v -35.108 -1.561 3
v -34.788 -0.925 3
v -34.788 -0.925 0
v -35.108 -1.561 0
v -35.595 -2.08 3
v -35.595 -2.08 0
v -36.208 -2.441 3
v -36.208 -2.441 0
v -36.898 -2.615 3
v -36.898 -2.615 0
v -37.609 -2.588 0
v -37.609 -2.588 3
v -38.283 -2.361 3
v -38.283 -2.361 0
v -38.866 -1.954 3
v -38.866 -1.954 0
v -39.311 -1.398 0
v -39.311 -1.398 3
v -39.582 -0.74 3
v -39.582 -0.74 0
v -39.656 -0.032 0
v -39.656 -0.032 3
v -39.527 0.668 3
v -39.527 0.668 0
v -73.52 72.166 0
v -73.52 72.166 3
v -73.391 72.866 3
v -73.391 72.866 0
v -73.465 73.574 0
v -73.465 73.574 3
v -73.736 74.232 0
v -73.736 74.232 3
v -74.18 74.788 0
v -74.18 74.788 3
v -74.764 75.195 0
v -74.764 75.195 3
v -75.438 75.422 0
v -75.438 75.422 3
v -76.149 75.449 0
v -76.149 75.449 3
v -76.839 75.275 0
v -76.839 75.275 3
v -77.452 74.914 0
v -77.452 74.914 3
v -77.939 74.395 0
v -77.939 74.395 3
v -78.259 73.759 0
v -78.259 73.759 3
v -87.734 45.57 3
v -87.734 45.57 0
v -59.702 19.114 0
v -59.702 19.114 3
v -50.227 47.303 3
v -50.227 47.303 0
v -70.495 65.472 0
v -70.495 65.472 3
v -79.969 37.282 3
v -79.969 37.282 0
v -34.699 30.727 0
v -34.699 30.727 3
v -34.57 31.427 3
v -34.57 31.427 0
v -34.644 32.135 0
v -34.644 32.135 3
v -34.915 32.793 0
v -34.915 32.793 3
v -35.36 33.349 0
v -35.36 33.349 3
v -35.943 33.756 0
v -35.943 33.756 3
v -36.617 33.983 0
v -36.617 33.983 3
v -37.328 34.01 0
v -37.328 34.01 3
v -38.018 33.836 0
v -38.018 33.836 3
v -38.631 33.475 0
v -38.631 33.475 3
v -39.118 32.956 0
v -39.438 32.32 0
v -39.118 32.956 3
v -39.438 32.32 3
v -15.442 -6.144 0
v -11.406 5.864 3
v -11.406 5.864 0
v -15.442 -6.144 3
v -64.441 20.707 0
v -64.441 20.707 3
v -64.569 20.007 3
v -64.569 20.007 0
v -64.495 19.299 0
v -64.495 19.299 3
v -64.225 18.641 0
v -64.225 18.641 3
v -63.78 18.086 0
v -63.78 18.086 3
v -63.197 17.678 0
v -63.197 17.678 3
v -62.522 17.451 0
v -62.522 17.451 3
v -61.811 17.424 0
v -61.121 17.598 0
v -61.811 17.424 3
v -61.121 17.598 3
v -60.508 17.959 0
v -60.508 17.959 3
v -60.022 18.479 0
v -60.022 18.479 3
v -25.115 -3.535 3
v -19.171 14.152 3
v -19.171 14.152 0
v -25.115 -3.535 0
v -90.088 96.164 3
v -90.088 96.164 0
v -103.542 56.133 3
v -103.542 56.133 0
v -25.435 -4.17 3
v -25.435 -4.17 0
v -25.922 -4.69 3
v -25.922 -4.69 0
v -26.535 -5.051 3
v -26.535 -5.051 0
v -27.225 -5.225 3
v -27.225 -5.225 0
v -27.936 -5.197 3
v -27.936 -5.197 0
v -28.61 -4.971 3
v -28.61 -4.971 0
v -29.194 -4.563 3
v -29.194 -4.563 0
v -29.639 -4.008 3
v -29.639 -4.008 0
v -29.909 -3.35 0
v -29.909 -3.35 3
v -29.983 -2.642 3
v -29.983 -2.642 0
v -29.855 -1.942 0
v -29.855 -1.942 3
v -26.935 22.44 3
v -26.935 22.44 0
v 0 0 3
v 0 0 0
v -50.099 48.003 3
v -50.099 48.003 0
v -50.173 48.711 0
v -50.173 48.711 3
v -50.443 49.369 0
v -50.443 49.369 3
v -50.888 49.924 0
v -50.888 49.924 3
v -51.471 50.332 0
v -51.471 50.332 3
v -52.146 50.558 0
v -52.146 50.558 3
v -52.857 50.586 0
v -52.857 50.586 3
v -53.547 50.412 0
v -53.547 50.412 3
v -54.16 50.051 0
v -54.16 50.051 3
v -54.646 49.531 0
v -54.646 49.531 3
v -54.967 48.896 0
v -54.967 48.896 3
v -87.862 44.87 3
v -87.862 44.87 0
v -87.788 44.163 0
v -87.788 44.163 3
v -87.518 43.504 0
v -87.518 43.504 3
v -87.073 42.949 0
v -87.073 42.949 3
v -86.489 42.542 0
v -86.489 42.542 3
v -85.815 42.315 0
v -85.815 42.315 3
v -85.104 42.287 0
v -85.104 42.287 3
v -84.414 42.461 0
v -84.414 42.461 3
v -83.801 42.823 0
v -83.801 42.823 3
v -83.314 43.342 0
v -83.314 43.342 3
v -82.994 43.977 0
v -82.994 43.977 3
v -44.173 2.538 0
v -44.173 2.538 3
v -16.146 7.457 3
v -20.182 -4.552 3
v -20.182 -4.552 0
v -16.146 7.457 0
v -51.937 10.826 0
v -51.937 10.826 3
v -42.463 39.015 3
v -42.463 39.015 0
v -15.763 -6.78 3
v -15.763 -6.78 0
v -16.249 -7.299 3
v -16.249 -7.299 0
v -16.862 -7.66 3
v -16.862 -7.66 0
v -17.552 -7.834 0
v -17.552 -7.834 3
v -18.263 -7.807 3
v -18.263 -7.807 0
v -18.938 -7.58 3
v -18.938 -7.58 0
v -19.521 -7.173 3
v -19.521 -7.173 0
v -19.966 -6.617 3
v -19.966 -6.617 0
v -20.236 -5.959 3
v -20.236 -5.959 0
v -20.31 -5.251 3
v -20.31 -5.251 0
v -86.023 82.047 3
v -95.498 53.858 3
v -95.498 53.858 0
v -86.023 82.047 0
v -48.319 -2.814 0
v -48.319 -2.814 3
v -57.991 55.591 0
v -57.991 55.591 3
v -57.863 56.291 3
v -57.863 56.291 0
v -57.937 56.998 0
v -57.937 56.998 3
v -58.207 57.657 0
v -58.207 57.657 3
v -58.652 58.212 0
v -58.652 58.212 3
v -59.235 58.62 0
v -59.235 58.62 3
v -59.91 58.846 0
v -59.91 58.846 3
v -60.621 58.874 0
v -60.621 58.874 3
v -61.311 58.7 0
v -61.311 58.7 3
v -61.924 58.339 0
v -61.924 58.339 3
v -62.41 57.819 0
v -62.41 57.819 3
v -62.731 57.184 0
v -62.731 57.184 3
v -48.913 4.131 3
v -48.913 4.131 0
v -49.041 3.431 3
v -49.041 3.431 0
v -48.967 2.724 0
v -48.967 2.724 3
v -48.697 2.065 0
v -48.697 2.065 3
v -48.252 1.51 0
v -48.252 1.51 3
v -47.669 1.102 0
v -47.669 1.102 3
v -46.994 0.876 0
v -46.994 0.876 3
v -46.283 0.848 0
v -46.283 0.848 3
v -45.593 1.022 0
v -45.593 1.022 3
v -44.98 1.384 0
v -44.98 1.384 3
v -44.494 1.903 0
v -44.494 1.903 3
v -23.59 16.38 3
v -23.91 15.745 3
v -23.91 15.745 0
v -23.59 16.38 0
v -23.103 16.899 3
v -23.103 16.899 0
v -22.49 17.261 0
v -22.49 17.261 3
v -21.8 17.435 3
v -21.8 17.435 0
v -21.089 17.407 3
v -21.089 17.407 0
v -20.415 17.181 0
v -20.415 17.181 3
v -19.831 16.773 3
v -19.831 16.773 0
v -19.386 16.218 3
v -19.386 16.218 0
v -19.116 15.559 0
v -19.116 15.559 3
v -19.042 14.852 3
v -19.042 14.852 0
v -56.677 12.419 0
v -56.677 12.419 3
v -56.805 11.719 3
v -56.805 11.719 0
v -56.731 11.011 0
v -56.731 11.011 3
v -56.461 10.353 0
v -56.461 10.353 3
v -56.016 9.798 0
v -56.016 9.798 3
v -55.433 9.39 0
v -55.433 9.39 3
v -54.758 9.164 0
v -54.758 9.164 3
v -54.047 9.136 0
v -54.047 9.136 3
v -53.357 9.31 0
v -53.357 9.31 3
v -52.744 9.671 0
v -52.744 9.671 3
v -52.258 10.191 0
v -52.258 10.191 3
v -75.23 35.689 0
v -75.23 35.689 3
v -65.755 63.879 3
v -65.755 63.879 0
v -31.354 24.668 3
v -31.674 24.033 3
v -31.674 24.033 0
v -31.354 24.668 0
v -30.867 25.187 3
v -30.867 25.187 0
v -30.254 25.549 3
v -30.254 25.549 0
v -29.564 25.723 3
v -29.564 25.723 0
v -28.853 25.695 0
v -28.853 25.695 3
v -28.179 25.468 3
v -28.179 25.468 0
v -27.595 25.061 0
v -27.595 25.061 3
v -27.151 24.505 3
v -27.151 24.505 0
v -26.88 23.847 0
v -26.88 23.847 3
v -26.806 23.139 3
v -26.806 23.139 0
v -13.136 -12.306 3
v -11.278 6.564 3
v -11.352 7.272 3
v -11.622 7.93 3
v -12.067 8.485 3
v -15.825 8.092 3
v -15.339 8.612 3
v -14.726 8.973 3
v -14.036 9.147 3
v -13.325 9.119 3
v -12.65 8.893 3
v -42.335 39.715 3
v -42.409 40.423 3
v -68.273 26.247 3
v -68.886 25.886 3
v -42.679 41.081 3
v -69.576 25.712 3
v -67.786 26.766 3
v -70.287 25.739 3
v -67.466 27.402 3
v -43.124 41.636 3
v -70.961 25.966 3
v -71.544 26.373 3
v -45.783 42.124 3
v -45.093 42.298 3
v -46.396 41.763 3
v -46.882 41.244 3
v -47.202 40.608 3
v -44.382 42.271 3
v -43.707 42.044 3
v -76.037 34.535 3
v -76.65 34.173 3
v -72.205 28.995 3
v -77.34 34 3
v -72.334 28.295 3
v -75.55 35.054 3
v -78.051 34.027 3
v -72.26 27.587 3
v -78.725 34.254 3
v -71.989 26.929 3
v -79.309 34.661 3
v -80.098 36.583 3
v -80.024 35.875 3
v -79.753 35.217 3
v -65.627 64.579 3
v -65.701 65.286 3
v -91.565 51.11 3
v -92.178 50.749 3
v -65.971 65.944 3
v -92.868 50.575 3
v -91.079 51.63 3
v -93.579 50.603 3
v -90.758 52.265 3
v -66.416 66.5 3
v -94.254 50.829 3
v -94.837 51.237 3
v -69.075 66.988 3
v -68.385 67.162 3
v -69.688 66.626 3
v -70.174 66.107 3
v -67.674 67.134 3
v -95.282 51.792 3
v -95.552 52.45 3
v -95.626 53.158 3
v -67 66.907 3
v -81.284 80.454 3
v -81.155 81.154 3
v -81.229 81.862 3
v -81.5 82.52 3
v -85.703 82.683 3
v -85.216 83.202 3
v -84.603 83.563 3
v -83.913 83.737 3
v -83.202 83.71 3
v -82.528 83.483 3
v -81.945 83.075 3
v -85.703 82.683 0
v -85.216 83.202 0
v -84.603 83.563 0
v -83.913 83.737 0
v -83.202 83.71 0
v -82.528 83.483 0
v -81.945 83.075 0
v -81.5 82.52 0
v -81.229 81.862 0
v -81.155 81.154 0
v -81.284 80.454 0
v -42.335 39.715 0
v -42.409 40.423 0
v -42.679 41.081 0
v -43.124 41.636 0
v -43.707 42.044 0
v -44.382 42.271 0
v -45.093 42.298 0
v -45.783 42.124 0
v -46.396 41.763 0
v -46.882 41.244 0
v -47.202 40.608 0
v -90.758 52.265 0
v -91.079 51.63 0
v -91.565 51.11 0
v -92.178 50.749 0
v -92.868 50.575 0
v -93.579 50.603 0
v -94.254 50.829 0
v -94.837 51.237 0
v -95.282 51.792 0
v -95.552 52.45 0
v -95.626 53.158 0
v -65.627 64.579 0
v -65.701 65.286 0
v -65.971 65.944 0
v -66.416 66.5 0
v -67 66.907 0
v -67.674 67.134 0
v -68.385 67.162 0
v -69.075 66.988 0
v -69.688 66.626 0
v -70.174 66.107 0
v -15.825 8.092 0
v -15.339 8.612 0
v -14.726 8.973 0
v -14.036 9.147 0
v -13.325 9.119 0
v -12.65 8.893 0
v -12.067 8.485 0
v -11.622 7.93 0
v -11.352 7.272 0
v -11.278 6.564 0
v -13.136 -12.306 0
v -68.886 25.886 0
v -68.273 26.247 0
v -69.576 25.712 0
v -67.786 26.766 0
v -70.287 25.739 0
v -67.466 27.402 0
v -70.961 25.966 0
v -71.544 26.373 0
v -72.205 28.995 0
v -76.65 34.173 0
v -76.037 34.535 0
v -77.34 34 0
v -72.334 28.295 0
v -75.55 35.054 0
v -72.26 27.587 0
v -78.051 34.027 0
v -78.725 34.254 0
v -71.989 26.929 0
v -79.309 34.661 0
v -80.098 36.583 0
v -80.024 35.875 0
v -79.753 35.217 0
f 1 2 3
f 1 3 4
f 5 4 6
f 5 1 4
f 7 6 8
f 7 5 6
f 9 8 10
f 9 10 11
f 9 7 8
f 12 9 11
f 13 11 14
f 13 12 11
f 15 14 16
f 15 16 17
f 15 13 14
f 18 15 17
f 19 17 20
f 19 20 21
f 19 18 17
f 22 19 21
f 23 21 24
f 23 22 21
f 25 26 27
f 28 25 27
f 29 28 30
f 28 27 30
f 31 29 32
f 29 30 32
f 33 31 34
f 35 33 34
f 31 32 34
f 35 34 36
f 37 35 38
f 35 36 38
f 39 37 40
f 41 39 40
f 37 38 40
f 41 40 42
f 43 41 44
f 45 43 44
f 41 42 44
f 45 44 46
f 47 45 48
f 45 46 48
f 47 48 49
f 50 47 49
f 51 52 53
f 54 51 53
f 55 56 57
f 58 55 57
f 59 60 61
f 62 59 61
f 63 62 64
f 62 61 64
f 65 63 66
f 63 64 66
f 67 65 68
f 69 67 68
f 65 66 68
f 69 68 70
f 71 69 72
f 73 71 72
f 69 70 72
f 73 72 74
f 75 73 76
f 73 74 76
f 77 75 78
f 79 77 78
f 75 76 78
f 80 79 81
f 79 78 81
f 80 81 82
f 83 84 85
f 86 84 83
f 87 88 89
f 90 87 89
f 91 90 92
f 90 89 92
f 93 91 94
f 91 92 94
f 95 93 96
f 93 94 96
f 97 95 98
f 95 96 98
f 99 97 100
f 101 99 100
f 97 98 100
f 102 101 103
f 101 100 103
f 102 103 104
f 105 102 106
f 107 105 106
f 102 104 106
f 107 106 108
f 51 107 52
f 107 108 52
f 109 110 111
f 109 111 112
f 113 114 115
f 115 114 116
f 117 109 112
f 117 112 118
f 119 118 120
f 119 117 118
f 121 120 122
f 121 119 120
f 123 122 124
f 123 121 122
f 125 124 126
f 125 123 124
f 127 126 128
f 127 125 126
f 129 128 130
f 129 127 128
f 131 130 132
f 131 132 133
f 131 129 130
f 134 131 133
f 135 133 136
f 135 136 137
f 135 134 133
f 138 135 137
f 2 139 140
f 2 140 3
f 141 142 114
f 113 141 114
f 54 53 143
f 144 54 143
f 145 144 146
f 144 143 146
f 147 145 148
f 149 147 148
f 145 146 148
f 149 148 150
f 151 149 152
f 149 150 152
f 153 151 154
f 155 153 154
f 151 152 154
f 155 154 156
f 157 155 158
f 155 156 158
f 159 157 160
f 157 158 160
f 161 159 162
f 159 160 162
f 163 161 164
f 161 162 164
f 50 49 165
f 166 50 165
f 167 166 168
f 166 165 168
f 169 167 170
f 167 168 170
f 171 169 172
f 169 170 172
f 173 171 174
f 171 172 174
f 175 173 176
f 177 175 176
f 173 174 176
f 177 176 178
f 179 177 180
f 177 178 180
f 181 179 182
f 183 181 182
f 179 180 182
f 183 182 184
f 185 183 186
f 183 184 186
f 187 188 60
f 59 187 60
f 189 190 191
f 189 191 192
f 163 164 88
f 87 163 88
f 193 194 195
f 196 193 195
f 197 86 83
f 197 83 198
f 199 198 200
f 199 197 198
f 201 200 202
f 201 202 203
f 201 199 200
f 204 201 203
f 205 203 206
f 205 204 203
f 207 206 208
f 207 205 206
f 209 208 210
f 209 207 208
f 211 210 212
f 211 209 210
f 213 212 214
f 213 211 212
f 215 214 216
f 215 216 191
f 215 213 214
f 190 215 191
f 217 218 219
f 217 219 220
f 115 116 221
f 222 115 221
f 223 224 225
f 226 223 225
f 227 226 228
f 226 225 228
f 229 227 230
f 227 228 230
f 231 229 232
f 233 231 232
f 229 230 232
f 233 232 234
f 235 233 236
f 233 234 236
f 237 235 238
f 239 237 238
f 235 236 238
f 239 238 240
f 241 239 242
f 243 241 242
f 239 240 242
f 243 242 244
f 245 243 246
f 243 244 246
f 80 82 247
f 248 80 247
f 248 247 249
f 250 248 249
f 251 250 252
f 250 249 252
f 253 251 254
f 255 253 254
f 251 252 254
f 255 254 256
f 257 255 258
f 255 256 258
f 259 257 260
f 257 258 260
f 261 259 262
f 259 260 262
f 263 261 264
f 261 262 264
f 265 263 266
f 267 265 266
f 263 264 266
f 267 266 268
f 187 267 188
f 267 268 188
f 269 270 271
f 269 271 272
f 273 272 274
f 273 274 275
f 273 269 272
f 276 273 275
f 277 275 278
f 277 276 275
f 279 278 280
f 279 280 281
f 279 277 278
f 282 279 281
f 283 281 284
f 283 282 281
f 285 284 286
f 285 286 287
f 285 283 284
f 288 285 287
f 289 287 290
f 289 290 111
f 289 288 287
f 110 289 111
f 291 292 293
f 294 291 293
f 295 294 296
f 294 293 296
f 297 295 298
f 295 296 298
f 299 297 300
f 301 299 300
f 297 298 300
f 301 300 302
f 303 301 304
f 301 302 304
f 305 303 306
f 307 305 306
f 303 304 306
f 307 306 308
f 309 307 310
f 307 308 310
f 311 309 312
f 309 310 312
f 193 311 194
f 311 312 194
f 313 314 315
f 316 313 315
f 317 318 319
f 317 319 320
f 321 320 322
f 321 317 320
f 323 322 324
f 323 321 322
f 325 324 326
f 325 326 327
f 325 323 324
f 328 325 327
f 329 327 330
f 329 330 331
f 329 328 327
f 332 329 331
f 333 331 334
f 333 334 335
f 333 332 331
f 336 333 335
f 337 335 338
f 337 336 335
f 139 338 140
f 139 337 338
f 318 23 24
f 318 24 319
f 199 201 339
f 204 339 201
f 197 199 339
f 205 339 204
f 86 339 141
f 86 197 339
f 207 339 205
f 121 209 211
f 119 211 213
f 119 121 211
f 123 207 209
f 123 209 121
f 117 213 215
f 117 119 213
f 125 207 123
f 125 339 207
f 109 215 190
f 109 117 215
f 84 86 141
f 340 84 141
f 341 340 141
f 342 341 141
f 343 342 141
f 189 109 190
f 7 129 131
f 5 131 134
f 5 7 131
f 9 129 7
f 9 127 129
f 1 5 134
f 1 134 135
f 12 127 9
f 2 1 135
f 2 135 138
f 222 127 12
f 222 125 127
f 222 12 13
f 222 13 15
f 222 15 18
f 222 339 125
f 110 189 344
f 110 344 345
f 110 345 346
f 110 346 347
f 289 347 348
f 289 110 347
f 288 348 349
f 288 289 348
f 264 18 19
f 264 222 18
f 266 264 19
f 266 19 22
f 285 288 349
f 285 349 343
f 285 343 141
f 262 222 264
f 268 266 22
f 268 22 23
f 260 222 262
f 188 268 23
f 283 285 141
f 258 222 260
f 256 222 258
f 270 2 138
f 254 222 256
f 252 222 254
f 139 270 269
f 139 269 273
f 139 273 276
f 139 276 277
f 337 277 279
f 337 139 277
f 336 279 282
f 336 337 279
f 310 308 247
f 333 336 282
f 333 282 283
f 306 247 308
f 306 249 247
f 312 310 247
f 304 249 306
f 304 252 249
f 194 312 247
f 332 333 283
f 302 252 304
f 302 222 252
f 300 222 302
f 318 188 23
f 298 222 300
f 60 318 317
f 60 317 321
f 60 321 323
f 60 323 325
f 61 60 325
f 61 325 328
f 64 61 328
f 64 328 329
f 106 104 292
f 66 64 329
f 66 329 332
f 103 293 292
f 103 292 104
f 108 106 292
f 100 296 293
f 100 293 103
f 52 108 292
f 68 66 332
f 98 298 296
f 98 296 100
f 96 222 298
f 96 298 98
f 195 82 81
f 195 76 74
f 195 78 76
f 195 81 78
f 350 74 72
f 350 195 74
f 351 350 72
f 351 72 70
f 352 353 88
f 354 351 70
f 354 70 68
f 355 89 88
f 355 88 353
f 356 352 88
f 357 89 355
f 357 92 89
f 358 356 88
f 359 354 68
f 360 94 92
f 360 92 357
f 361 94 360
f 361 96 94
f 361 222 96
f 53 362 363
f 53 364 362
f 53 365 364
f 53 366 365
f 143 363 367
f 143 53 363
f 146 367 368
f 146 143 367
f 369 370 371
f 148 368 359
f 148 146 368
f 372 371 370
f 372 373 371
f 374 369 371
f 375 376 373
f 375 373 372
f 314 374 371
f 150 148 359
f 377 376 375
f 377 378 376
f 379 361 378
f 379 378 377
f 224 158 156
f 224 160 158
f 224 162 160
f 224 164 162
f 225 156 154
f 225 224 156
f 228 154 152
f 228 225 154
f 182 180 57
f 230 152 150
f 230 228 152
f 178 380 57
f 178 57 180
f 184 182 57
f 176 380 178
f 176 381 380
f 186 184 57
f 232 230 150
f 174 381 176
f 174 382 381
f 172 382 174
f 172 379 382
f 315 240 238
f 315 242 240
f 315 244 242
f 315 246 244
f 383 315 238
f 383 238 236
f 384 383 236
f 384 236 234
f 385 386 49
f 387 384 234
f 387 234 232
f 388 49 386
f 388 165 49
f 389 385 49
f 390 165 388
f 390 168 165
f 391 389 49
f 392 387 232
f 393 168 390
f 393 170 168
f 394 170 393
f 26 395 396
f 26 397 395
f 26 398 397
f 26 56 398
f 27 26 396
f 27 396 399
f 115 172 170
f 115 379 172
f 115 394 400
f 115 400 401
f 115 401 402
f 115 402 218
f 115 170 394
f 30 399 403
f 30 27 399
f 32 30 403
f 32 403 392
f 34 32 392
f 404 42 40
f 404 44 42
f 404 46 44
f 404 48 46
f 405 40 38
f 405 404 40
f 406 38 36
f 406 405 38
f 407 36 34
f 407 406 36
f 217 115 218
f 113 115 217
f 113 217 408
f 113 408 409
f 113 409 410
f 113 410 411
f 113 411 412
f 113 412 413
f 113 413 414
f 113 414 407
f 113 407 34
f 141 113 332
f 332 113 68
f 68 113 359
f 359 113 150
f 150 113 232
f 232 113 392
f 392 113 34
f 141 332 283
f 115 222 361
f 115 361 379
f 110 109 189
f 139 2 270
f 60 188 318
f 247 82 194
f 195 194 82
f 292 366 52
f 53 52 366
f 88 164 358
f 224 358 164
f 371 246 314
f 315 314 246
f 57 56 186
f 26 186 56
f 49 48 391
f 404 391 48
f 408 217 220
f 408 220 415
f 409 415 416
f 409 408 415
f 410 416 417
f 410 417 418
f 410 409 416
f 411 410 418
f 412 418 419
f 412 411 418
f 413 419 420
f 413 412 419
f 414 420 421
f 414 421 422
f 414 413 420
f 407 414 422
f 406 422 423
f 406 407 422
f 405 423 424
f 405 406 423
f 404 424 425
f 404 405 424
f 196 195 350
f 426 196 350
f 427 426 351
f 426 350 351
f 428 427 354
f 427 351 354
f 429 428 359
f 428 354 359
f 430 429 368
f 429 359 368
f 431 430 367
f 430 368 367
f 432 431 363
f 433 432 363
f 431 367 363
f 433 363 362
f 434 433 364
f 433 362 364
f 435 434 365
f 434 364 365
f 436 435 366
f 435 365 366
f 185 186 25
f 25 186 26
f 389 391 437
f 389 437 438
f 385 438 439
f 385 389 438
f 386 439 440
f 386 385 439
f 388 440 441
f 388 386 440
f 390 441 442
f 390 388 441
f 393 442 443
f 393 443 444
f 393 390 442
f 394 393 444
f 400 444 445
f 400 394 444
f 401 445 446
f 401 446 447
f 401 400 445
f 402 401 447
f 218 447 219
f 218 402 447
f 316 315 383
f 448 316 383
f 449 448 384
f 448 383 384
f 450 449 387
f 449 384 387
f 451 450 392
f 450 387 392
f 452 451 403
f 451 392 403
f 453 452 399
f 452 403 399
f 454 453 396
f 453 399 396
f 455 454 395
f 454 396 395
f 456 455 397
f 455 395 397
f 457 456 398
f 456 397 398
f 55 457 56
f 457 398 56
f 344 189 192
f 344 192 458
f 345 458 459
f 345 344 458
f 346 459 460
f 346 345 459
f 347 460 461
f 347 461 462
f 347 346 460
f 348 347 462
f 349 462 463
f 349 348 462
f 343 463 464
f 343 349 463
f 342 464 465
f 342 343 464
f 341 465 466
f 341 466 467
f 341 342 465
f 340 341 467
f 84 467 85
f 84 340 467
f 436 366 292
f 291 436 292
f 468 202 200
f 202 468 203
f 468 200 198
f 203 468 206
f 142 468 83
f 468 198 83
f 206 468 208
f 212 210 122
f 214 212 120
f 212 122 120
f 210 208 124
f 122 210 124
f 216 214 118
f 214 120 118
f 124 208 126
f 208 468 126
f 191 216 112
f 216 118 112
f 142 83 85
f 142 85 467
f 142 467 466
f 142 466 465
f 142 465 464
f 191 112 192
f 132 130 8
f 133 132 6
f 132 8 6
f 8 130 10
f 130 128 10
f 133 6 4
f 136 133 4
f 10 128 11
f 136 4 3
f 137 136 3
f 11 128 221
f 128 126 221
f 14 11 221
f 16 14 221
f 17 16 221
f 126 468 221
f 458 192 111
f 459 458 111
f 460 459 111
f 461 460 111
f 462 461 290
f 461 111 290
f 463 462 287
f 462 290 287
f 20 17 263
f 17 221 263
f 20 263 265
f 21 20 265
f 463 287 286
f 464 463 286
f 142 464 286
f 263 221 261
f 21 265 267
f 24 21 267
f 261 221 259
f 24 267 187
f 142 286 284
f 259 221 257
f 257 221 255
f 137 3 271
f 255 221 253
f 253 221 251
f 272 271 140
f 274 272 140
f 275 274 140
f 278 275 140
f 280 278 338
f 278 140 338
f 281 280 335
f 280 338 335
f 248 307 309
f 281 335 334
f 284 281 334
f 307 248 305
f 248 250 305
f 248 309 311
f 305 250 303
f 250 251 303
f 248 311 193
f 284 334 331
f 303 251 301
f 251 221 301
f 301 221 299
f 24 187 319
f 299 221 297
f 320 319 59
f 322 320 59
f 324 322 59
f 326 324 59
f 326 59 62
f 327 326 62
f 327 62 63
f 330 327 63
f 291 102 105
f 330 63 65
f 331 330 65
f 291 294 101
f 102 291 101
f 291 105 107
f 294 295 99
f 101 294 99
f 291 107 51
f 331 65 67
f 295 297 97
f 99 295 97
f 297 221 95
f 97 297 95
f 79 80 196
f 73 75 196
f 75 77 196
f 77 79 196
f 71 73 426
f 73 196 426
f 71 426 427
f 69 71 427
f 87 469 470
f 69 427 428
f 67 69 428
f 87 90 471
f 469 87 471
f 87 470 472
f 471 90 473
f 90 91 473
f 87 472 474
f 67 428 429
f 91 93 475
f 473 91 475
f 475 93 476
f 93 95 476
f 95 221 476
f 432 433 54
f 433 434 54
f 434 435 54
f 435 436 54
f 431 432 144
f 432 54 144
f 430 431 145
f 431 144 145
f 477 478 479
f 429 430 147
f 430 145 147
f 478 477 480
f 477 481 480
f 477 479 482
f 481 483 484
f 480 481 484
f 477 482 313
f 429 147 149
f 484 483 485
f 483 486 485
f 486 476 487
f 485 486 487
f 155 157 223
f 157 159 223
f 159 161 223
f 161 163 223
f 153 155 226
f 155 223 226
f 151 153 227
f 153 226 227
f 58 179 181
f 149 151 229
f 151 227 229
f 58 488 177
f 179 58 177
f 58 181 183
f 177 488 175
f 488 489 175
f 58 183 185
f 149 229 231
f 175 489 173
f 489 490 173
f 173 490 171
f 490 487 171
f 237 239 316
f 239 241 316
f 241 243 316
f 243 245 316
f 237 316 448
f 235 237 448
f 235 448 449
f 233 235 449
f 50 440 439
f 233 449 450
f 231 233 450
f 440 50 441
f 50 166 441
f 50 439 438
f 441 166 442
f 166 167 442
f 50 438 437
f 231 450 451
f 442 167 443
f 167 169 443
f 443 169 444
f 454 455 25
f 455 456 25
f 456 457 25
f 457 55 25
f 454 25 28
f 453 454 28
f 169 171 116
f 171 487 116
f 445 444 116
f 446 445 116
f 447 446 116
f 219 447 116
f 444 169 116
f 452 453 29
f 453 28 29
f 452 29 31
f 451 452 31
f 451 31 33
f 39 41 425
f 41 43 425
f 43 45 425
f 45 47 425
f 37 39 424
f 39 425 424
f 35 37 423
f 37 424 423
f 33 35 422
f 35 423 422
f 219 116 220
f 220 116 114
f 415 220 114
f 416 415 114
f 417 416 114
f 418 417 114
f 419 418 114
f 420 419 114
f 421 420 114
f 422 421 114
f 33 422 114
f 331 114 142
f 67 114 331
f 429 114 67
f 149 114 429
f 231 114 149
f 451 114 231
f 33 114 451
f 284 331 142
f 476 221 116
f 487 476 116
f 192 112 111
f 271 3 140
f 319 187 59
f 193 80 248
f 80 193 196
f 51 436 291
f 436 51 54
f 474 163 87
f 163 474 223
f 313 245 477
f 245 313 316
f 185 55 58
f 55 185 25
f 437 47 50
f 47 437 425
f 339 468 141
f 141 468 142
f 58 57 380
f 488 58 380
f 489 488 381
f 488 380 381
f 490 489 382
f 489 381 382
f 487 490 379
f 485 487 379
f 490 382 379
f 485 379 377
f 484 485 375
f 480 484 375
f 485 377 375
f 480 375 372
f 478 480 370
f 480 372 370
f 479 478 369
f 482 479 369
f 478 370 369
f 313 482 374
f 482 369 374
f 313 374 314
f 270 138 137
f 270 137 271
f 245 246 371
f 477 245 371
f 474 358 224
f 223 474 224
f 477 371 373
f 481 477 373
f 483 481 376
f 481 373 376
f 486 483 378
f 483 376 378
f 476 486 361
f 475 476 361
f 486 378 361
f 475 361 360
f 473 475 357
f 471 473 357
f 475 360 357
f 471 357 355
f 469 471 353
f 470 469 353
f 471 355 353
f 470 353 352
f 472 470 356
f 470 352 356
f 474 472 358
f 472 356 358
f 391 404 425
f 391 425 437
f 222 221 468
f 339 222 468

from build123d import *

# Parameters (mm, degrees)
BOSS_EXTRUDE1_DEPTH = 3
CUT_EXTRUDE1_DEPTH  = 3


with BuildPart() as part:
    # Sketch1 → Boss-Extrude1 (new body)
    with BuildSketch(Plane(origin=(766.479324321, -257.616944778, 0), x_dir=(0.26047542598858736, 0.9654804775116191, 0), z_dir=(0, 0, 1))):
        Polygon((33.772102577, 853.041764539), (33.772102577, 816.600953816), (49.075102345, 807.123707481), (118.453517154, 919.149693533), (76.300457153, 921.712703038), align=None)
    extrude(amount=BOSS_EXTRUDE1_DEPTH)

    # Sketch2 → Cut-Extrude1 (cut)
    with BuildSketch(Plane(origin=(0, 0, 3), x_dir=(0.26047542598858736, 0.965480477511619, 0), z_dir=(0, 0, 1))):
        with BuildLine():
            Line((20.841316823, 91.584158174), (50.525265903, 89.779301217))
            ThreePointArc((50.525265903, 89.779301217), (53.172383437, 92.122966884), (50.82871777, 94.770084418))
            Line((50.82871777, 94.770084418), (21.144768691, 96.574941376))
            ThreePointArc((21.144768691, 96.574941376), (18.497651156, 94.231275709), (20.841316823, 91.584158174))
        make_face()
        with BuildLine():
            Line((14.861969696, 81.929249515), (44.545918775, 80.124392558))
            ThreePointArc((44.545918775, 80.124392558), (47.19303631, 82.468058225), (44.849370643, 85.115175759))
            Line((44.849370643, 85.115175759), (15.165421563, 86.920032717))
            ThreePointArc((15.165421563, 86.920032717), (12.518304029, 84.57636705), (14.861969696, 81.929249515))
        make_face()
        with BuildLine():
            Line((27.124115818, 106.229850035), (56.808064898, 104.424993077))
            ThreePointArc((56.808064898, 104.424993077), (59.151730565, 101.777875543), (56.50461303, 99.434209876))
            Line((56.50461303, 99.434209876), (26.82066395, 101.239066833))
            ThreePointArc((26.82066395, 101.239066833), (24.476998283, 103.886184368), (27.124115818, 106.229850035))
        make_face()
        with BuildLine():
            Line((8.882622568, 72.274340856), (38.566571648, 70.469483899))
            ThreePointArc((38.566571648, 70.469483899), (41.213689182, 72.813149566), (38.870023515, 75.4602671))
            Line((38.870023515, 75.4602671), (9.186074436, 77.265124058))
            ThreePointArc((9.186074436, 77.265124058), (6.538956901, 74.921458391), (8.882622568, 72.274340856))
        make_face()
        with BuildLine():
            Line((2.903275441, 62.619432197), (32.58722452, 60.814575239))
            ThreePointArc((32.58722452, 60.814575239), (35.234342055, 63.158240906), (32.890676388, 65.805358441))
            Line((32.890676388, 65.805358441), (3.206727308, 67.610215399))
            ThreePointArc((3.206727308, 67.610215399), (0.559609774, 65.266549732), (2.903275441, 62.619432197))
        make_face()
        with BuildLine():
            Line((-3.076071687, 52.964523538), (26.607877393, 51.15966658))
            ThreePointArc((26.607877393, 51.15966658), (29.254994927, 53.503332247), (26.911329261, 56.150449782))
            Line((26.911329261, 56.150449782), (-2.772619819, 57.95530674))
            ThreePointArc((-2.772619819, 57.95530674), (-5.419737354, 55.611641073), (-3.076071687, 52.964523538))
        make_face()
        with BuildLine():
            Line((-9.055418814, 43.309614879), (20.628530266, 41.504757921))
            ThreePointArc((20.628530266, 41.504757921), (23.2756478, 43.848423588), (20.931982133, 46.495541123))
            Line((20.931982133, 46.495541123), (-8.751966947, 48.30039808))
            ThreePointArc((-8.751966947, 48.30039808), (-11.399084481, 45.956732414), (-9.055418814, 43.309614879))
        make_face()
        with BuildLine():
            Line((-9.651273834, 38.336610507), (14.952635006, 36.840632464))
            ThreePointArc((14.952635006, 36.840632464), (17.296300673, 34.193514929), (14.649183138, 31.849849262))
            Line((14.649183138, 31.849849262), (-9.954725702, 33.345827305))
            ThreePointArc((-9.954725702, 33.345827305), (-12.298391369, 35.99294484), (-9.651273834, 38.336610507))
        make_face()
        with BuildLine():
            Line((-9.651273834, 28.318142867), (8.973287878, 27.185723805))
            ThreePointArc((8.973287878, 27.185723805), (11.316953545, 24.53860627), (8.669836011, 22.194940603))
            Line((8.669836011, 22.194940603), (-9.954725702, 23.327359666))
            ThreePointArc((-9.954725702, 23.327359666), (-12.298391369, 25.9744772), (-9.651273834, 28.318142867))
        make_face()
        with BuildLine():
            Line((-9.651273834, 18.299675228), (2.993940751, 17.530815146))
            ThreePointArc((2.993940751, 17.530815146), (5.337606418, 14.883697611), (2.690488883, 12.540031944))
            Line((2.690488883, 12.540031944), (-9.954725702, 13.308892026))
            ThreePointArc((-9.954725702, 13.308892026), (-12.298391369, 15.956009561), (-9.651273834, 18.299675228))
        make_face()
    extrude(amount=-CUT_EXTRUDE1_DEPTH, mode=Mode.SUBTRACT)


solid = part.part
